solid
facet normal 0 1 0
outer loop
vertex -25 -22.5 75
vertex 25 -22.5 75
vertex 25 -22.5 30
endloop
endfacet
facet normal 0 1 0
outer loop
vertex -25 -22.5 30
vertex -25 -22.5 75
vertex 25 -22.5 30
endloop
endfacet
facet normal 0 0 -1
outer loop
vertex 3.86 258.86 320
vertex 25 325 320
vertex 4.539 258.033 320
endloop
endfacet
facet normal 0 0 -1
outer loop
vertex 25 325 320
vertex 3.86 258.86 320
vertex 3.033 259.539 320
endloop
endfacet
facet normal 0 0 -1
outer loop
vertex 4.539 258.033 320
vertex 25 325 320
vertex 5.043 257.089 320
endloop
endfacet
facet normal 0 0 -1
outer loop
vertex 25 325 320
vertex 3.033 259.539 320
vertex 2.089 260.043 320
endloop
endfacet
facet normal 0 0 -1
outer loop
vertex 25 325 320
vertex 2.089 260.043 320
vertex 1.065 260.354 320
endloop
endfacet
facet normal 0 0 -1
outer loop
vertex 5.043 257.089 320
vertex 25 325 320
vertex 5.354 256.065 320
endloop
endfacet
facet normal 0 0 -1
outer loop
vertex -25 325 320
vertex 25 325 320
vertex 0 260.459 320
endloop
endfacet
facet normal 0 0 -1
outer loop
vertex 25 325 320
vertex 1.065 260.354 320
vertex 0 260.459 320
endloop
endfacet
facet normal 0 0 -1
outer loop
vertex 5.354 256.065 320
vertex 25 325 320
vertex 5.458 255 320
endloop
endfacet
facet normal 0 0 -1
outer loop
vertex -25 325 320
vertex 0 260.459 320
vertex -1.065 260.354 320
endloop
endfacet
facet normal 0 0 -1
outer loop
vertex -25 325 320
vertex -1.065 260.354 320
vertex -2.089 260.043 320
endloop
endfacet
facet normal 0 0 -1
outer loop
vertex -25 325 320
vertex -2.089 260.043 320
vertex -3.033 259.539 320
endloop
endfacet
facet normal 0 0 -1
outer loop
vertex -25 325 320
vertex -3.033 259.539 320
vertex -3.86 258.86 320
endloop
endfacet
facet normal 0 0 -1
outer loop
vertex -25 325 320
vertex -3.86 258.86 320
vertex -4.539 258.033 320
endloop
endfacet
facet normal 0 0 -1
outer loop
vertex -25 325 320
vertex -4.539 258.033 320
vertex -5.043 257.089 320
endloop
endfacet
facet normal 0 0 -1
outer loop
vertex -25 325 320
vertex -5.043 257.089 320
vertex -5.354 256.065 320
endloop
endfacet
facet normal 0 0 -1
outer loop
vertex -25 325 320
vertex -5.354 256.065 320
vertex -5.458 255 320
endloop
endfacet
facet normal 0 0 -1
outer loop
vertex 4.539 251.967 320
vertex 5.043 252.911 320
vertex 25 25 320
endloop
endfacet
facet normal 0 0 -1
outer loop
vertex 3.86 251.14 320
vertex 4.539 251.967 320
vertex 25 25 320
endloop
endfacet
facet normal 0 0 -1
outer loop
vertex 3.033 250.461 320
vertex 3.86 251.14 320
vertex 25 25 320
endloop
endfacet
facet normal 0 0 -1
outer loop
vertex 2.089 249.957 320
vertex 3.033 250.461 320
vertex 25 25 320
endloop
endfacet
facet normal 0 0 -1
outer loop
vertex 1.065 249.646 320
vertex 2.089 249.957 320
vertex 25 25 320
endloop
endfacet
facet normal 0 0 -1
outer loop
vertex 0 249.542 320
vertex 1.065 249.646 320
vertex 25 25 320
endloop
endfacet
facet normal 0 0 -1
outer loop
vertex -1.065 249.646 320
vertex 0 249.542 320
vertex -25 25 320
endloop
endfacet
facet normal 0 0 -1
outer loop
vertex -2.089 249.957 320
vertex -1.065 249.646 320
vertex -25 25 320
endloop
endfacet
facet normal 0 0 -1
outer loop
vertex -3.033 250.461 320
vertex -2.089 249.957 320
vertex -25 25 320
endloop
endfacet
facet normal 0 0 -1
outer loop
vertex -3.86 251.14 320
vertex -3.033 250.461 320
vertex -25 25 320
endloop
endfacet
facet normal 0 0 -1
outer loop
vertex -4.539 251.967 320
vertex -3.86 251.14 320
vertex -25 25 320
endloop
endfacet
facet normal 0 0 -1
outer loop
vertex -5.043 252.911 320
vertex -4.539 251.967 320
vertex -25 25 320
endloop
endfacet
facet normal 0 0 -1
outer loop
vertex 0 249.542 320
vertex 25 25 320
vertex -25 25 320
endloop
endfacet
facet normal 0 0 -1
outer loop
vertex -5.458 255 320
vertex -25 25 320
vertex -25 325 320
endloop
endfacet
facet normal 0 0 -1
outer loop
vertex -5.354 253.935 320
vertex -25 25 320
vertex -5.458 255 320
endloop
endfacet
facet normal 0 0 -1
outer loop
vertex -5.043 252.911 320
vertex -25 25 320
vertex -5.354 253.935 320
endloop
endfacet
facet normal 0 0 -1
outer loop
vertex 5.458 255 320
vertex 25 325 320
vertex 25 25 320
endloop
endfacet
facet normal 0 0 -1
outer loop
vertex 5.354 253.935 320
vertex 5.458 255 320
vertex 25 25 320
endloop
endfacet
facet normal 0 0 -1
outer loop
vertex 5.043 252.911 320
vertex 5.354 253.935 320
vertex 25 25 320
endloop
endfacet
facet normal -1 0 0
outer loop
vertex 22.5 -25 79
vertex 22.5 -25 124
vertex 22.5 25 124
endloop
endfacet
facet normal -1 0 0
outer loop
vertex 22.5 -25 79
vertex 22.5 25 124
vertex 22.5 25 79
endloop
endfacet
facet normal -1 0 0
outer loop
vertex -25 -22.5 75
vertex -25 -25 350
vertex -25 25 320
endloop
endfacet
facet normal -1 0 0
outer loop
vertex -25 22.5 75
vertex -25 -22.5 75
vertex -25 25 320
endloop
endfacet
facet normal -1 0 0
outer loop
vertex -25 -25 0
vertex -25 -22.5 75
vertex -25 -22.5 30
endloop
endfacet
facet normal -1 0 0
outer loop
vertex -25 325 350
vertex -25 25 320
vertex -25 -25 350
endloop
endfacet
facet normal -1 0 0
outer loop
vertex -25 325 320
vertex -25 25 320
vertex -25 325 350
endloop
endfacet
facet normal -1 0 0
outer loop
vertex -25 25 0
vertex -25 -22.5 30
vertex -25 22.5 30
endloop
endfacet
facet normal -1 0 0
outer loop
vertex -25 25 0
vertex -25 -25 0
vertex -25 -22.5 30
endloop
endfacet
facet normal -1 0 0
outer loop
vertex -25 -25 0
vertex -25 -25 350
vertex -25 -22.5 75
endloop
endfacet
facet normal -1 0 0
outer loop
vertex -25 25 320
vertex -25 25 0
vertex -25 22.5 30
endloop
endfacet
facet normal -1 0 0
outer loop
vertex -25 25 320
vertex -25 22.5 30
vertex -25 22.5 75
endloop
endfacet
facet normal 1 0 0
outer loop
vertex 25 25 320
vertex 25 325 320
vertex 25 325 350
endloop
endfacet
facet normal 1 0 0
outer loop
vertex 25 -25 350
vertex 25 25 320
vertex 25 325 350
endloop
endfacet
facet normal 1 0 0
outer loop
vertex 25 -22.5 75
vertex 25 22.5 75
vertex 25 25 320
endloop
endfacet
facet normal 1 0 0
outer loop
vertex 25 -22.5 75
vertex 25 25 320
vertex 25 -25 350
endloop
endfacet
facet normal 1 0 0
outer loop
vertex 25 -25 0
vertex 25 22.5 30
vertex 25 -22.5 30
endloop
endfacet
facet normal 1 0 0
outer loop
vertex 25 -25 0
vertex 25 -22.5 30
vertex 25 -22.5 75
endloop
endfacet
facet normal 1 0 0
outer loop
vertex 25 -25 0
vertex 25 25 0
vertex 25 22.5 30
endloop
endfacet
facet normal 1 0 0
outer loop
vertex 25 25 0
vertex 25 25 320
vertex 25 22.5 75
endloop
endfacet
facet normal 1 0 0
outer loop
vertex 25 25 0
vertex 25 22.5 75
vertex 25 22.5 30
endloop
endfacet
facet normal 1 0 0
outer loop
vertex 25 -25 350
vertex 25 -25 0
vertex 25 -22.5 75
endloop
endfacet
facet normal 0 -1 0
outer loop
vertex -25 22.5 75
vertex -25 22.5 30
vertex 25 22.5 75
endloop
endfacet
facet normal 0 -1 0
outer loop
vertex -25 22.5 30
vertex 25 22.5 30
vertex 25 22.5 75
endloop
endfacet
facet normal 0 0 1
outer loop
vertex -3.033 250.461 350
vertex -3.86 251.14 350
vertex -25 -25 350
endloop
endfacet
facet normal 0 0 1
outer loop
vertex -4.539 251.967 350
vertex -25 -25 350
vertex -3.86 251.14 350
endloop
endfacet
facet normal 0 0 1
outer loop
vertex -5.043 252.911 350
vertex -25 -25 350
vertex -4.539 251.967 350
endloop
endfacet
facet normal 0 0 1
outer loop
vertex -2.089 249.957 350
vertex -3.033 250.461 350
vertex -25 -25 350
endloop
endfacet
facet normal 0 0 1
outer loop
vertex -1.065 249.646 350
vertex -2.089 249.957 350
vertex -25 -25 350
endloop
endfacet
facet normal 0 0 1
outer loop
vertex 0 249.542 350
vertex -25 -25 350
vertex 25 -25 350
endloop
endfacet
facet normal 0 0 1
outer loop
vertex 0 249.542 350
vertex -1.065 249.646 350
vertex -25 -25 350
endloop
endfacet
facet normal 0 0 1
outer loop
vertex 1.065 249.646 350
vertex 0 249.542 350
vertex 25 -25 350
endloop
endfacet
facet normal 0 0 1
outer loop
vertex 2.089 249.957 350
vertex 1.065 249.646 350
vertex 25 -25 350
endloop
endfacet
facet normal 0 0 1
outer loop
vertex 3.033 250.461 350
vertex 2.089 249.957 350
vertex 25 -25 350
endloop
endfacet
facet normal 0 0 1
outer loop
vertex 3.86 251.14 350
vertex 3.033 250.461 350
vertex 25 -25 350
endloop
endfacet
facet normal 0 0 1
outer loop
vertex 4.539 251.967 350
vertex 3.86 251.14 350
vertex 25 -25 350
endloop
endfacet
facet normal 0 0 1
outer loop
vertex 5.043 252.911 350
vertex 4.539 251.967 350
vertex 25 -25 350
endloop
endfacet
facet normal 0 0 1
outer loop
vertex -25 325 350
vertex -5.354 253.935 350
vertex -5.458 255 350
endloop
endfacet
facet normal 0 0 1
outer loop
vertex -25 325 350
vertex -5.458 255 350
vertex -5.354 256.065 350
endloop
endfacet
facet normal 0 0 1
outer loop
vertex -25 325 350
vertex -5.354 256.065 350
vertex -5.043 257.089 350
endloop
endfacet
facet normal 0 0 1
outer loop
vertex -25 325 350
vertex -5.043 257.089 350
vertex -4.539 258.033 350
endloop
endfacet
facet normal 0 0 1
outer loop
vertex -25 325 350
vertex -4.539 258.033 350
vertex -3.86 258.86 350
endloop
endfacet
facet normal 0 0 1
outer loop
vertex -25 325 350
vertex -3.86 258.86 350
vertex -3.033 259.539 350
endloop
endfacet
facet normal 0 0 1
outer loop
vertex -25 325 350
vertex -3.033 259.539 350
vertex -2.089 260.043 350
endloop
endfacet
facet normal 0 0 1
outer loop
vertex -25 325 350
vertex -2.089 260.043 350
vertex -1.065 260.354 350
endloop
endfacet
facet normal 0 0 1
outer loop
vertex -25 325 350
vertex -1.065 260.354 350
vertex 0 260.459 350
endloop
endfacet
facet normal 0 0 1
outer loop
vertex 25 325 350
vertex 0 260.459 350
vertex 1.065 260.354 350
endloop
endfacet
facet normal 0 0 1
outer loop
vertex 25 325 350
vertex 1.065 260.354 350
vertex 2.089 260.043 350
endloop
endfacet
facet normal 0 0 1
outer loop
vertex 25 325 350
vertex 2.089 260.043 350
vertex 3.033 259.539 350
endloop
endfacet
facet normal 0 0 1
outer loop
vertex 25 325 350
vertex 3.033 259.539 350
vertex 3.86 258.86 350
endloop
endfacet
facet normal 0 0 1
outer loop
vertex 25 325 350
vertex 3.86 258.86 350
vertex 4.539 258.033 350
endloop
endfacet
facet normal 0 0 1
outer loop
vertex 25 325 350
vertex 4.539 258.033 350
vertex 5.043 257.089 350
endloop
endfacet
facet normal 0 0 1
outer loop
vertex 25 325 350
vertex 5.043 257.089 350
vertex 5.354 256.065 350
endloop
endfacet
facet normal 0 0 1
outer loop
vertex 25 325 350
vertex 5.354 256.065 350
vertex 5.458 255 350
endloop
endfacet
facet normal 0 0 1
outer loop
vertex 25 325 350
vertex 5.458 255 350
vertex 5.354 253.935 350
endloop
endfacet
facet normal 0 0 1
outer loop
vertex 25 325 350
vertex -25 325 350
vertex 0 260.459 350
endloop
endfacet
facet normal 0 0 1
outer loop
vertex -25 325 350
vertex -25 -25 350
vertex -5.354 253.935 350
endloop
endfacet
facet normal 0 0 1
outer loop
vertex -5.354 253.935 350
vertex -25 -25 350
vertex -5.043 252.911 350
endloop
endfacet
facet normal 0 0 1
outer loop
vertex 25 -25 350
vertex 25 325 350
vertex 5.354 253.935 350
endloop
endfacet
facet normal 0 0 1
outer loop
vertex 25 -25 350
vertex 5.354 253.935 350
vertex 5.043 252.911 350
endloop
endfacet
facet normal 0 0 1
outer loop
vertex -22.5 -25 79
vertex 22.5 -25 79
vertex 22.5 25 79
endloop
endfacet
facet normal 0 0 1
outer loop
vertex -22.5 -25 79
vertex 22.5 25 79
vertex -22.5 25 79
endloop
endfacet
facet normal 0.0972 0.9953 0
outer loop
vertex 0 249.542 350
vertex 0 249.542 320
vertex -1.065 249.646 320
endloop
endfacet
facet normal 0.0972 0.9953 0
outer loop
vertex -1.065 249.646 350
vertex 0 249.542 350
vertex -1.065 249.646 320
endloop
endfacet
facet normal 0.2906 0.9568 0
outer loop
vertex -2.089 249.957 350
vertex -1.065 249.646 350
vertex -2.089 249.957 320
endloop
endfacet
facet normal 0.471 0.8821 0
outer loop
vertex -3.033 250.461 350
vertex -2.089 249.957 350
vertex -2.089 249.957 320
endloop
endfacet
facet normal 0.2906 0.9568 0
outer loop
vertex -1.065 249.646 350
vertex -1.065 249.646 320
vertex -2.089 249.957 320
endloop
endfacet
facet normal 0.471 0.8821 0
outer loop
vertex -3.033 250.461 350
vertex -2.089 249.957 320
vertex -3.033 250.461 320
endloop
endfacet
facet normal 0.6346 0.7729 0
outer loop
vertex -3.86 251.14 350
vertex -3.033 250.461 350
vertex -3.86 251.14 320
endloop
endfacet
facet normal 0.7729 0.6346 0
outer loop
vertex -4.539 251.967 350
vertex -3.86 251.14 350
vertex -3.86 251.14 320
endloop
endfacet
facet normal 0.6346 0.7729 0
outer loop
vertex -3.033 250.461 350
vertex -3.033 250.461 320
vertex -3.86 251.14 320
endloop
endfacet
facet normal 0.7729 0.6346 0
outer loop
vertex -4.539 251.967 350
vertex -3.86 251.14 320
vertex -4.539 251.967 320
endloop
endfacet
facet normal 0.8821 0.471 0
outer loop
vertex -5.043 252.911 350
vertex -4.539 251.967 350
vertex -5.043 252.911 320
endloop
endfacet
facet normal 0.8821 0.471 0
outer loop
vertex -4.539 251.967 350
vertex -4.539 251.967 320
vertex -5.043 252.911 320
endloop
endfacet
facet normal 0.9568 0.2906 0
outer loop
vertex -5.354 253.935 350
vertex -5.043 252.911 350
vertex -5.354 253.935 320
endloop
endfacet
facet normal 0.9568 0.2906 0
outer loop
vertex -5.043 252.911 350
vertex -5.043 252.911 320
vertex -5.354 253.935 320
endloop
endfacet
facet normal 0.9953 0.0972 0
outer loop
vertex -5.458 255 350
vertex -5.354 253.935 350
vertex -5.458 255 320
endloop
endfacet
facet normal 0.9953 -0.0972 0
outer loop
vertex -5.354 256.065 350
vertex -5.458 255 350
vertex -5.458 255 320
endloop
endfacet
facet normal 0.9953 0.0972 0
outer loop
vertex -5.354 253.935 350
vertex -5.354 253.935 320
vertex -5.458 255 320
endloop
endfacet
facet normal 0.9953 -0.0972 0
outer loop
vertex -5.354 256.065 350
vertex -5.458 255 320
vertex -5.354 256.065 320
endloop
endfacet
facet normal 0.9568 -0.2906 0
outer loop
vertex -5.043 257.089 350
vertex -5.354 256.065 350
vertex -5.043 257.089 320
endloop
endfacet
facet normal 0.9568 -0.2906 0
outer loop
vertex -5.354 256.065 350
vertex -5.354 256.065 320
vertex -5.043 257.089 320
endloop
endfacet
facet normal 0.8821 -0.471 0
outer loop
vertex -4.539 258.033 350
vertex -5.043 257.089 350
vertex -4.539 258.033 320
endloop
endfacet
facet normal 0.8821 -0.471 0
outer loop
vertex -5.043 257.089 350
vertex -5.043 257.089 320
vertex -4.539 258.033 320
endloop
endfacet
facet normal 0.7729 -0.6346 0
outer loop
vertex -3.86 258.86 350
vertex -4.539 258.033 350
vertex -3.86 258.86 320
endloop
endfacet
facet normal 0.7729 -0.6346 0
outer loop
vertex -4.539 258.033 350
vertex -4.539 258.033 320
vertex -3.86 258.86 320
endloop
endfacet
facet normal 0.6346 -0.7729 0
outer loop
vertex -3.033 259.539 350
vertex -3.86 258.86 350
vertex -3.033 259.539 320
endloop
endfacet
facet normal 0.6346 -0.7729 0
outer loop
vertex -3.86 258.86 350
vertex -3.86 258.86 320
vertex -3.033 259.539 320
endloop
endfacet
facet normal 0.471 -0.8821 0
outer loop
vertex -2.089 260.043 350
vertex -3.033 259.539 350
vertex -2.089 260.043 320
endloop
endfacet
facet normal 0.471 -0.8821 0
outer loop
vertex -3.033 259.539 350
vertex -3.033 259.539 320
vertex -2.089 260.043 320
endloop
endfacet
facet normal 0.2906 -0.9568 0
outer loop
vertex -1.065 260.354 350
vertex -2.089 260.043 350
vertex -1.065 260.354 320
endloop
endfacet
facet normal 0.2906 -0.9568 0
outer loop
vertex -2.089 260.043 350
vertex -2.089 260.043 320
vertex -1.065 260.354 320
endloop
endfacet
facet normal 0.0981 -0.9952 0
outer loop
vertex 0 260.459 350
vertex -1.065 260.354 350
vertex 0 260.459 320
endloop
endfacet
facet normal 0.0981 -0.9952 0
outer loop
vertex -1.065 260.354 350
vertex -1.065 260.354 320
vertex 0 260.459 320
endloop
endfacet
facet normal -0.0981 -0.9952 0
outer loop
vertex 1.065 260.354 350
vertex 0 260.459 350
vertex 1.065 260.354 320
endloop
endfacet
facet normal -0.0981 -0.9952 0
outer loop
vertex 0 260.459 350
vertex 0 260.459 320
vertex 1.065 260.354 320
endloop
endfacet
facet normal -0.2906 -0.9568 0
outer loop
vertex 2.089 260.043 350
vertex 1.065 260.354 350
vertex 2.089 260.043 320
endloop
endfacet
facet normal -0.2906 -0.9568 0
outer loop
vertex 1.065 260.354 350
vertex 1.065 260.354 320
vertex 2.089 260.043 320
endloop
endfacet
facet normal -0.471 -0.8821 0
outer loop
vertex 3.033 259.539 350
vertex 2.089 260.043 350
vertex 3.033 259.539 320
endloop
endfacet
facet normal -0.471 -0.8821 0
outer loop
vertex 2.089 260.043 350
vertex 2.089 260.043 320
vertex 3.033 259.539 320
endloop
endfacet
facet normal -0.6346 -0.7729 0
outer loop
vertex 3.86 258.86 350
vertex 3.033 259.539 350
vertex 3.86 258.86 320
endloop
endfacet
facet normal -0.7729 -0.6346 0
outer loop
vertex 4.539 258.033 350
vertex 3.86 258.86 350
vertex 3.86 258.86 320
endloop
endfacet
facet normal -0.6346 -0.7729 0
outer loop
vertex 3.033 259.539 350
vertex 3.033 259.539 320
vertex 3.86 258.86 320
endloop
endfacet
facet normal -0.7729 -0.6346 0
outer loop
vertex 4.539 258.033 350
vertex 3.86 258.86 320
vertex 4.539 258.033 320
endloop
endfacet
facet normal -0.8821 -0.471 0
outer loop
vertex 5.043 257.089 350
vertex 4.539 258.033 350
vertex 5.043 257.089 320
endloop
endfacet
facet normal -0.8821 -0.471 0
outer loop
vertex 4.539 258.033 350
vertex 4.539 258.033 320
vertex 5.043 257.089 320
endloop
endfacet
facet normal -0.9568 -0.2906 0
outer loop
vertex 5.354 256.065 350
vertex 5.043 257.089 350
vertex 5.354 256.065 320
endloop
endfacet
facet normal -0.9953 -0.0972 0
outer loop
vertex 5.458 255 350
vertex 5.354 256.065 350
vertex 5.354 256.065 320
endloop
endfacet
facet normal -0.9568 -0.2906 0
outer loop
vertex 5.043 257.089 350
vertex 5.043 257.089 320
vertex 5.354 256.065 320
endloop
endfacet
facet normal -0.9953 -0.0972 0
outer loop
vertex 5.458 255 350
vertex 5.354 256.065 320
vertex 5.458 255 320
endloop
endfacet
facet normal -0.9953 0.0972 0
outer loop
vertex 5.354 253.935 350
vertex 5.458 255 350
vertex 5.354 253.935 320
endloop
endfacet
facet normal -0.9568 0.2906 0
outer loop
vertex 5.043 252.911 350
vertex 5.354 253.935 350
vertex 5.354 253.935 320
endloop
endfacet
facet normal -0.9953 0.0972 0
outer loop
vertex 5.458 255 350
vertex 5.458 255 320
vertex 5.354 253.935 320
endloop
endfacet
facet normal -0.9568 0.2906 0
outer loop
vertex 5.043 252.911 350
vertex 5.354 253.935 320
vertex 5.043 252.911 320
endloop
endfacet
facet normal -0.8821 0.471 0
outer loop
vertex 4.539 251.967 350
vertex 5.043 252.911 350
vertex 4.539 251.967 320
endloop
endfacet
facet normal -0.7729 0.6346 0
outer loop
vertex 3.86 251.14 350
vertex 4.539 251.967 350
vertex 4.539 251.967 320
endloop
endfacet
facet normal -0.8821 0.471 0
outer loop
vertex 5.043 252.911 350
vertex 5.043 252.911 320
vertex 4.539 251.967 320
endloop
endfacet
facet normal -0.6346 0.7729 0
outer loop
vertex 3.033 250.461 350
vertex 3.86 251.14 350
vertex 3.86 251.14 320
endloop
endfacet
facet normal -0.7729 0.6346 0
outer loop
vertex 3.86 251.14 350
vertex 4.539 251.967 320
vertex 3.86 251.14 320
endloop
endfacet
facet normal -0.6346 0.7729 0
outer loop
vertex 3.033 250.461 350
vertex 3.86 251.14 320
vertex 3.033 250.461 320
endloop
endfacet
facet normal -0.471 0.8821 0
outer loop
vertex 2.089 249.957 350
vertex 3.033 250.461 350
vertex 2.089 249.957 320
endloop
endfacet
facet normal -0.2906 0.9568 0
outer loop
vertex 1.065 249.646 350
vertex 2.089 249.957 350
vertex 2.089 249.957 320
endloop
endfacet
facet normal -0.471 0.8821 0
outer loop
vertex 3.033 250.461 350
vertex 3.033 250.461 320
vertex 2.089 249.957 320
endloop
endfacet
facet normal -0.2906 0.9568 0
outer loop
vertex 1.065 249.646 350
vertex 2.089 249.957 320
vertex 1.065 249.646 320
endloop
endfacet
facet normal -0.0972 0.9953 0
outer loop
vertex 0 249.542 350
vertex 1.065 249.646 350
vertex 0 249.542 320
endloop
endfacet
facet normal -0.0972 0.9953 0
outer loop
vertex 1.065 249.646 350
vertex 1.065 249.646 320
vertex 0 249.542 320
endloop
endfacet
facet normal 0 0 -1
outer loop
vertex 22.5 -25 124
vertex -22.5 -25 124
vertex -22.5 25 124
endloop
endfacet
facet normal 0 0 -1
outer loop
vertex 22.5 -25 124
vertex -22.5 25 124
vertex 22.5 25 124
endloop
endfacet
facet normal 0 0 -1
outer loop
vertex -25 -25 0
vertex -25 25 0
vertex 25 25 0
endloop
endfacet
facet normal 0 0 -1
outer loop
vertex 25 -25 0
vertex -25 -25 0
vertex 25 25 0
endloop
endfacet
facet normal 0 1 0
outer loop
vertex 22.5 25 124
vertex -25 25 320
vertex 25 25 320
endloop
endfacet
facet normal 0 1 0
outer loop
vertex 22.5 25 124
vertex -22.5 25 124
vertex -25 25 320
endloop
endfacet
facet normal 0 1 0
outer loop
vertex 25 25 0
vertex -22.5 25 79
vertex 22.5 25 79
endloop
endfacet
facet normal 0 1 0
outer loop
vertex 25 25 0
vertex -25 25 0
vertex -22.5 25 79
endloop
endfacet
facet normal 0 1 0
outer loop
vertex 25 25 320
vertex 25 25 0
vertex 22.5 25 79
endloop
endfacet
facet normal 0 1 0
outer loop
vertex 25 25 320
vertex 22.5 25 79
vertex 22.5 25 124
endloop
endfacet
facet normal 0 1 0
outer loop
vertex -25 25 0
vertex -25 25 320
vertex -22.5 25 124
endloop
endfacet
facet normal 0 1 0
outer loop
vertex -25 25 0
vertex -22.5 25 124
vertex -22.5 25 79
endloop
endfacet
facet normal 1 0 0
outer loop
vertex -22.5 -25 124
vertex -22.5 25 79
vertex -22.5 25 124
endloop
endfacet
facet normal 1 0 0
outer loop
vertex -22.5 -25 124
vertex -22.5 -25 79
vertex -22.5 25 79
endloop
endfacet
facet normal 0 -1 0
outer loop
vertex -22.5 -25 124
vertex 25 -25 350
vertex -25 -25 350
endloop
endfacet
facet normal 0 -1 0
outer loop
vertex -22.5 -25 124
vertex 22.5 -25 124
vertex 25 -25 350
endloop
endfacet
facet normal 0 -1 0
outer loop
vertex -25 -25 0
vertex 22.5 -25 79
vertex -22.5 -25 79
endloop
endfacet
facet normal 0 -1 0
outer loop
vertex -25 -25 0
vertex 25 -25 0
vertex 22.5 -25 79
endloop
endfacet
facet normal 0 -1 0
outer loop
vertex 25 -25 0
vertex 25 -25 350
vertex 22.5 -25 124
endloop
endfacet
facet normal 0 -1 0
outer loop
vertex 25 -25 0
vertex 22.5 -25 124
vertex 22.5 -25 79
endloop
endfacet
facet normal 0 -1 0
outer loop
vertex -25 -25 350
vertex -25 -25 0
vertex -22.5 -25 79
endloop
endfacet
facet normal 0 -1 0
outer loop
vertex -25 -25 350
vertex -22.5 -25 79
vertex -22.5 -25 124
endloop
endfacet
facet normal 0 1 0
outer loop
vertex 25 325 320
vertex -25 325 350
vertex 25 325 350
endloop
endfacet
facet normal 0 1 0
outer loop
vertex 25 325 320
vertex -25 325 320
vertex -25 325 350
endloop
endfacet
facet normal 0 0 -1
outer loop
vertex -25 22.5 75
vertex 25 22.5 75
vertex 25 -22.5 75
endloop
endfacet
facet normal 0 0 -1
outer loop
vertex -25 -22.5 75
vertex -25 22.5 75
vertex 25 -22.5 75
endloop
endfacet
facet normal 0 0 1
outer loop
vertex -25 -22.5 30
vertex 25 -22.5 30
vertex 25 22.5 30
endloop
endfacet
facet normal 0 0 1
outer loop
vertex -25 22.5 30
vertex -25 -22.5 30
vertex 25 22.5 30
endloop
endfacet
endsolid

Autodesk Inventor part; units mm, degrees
ref_plane "YZ Plane" through (0, 0, 0) normal (1, 0, 0) x (0, 1, 0)
ref_plane "XZ Plane" through (0, 0, 0) normal (0, 1, 0) x (-1, 0, 0)
ref_plane "XY Plane" through (0, 0, 0) normal (0, 0, 1) x (1, 0, 0)
sketch "Sketch1" plane through (0, 0, 0) normal (0, 0, 1) x (1, 0, 0)
  line L0 (-25, 25) -> (25, 25)
  line L1 (25, 25) -> (25, -25)
  line L2 (25, -25) -> (-25, -25)
  line L3 (-25, -25) -> (-25, 25)
  point P0 (0, 0)
  dimension "d0" = 50
  dimension "d1" = 25
  dimension "d2" = 25
  dimension "d3" = 25
extrude "Extrusion1" add sketch "Sketch1" along normal blind 350
sketch "Sketch2" plane through (-25, 25, 0) normal (0, 1, 0) x (1, 0, 0)
  line L0 (50, -350) -> (0, -350) projected
  line L1 (50, 0) -> (50, -350) projected
  line L2 (0, -350) -> (50, -350)
  line L3 (50, -350) -> (50, -320)
  line L4 (50, -320) -> (0, -320)
  line L5 (0, -320) -> (0, -350)
  point P0 (25, 0)
  dimension "d6" = 30
extrude "Extrusion2" add sketch "Sketch2" along normal blind 300
sketch "Sketch3" plane through (0, 0, 350) normal (0, 0, 1) x (1, 0, 0)
  line L0 (-25, 325) -> (25, 325) projected
  line L1 (25, -25) -> (25, 325) projected
  point P0 (0, 0)
  point P1 (0, 255)
  dimension "d9" = 70
  dimension "d10" = 25
hole "Hole1" at (0, 255, 350) direction (0, 0, -1) diameter 10.917 end through all thread size "M12x1" class "6H" standard "ANSI Metric M Profile"
sketch "Sketch6" plane through (25, -25, 0) normal (1, 0, 0) x (0, 0, -1)
  line L0 (-75, 2.5) -> (-30, 2.5)
  line L1 (-30, 2.5) -> (-30, 47.5)
  line L2 (-30, 47.5) -> (-75, 47.5)
  line L3 (-75, 47.5) -> (-75, 2.5)
  line L4 (0, 50) -> (0, 0) projected
  line L5 (0, 0) -> (-350, 0) projected
  point P0 (0, 25)
  dimension "d36" = 45
  dimension "d37" = 45
  dimension "d38" = 30
  dimension "d39" = 2.5
extrude "Extrusion3" cut sketch "Sketch6" against normal blind 50
sketch "Sketch7" plane through (-25, -25, 0) normal (0, -1, 0) x (1, 0, 0)
  line L0 (50, 0) -> (0, 0) projected
  line L1 (50, 0) -> (50, 350) projected
  point P0 (25, 0)
  point P1 (25, 102)
  dimension "d42" = 102
  dimension "d43" = 25
hole "Hole4" at (0, -25, 102) direction (0, 1, 0) diameter 11.835 end through all thread size "M14x2" class "6H" standard "ANSI Metric M Profile"
sketch "Sketch8" plane through (-25, -25, 0) normal (0, -1, 0) x (1, 0, 0)
  line L0 (2.5, 124) -> (47.5, 124)
  line L1 (47.5, 124) -> (47.5, 79)
  line L2 (47.5, 79) -> (2.5, 79)
  line L3 (2.5, 79) -> (2.5, 124)
  line L4 (50, 0) -> (0, 0) projected
  line L5 (0, 0) -> (0, 350) projected
  point P0 (25, 0)
  dimension "d51" = 45
  dimension "d52" = 45
  dimension "d53" = 79
  dimension "d54" = 2.5
extrude "Extrusion4" cut sketch "Sketch8" against normal blind 50
sketch "Sketch9" plane through (25, -25, 0) normal (1, 0, 0) x (0, 0, -1)
  line L0 (0, 50) -> (0, 0) projected
  line L1 (0, 0) -> (-350, 0) projected
  point P0 (0, 25)
  point P1 (-52.5, 25)
  dimension "d57" = 52.5
  dimension "d58" = 25
hole "Hole5" at (25, 0, 52.5) direction (-1, 0, 0) diameter 11.835 end through all thread size "M14x2" class "6H" standard "ANSI Metric M Profile"
properties part number "brazo"
